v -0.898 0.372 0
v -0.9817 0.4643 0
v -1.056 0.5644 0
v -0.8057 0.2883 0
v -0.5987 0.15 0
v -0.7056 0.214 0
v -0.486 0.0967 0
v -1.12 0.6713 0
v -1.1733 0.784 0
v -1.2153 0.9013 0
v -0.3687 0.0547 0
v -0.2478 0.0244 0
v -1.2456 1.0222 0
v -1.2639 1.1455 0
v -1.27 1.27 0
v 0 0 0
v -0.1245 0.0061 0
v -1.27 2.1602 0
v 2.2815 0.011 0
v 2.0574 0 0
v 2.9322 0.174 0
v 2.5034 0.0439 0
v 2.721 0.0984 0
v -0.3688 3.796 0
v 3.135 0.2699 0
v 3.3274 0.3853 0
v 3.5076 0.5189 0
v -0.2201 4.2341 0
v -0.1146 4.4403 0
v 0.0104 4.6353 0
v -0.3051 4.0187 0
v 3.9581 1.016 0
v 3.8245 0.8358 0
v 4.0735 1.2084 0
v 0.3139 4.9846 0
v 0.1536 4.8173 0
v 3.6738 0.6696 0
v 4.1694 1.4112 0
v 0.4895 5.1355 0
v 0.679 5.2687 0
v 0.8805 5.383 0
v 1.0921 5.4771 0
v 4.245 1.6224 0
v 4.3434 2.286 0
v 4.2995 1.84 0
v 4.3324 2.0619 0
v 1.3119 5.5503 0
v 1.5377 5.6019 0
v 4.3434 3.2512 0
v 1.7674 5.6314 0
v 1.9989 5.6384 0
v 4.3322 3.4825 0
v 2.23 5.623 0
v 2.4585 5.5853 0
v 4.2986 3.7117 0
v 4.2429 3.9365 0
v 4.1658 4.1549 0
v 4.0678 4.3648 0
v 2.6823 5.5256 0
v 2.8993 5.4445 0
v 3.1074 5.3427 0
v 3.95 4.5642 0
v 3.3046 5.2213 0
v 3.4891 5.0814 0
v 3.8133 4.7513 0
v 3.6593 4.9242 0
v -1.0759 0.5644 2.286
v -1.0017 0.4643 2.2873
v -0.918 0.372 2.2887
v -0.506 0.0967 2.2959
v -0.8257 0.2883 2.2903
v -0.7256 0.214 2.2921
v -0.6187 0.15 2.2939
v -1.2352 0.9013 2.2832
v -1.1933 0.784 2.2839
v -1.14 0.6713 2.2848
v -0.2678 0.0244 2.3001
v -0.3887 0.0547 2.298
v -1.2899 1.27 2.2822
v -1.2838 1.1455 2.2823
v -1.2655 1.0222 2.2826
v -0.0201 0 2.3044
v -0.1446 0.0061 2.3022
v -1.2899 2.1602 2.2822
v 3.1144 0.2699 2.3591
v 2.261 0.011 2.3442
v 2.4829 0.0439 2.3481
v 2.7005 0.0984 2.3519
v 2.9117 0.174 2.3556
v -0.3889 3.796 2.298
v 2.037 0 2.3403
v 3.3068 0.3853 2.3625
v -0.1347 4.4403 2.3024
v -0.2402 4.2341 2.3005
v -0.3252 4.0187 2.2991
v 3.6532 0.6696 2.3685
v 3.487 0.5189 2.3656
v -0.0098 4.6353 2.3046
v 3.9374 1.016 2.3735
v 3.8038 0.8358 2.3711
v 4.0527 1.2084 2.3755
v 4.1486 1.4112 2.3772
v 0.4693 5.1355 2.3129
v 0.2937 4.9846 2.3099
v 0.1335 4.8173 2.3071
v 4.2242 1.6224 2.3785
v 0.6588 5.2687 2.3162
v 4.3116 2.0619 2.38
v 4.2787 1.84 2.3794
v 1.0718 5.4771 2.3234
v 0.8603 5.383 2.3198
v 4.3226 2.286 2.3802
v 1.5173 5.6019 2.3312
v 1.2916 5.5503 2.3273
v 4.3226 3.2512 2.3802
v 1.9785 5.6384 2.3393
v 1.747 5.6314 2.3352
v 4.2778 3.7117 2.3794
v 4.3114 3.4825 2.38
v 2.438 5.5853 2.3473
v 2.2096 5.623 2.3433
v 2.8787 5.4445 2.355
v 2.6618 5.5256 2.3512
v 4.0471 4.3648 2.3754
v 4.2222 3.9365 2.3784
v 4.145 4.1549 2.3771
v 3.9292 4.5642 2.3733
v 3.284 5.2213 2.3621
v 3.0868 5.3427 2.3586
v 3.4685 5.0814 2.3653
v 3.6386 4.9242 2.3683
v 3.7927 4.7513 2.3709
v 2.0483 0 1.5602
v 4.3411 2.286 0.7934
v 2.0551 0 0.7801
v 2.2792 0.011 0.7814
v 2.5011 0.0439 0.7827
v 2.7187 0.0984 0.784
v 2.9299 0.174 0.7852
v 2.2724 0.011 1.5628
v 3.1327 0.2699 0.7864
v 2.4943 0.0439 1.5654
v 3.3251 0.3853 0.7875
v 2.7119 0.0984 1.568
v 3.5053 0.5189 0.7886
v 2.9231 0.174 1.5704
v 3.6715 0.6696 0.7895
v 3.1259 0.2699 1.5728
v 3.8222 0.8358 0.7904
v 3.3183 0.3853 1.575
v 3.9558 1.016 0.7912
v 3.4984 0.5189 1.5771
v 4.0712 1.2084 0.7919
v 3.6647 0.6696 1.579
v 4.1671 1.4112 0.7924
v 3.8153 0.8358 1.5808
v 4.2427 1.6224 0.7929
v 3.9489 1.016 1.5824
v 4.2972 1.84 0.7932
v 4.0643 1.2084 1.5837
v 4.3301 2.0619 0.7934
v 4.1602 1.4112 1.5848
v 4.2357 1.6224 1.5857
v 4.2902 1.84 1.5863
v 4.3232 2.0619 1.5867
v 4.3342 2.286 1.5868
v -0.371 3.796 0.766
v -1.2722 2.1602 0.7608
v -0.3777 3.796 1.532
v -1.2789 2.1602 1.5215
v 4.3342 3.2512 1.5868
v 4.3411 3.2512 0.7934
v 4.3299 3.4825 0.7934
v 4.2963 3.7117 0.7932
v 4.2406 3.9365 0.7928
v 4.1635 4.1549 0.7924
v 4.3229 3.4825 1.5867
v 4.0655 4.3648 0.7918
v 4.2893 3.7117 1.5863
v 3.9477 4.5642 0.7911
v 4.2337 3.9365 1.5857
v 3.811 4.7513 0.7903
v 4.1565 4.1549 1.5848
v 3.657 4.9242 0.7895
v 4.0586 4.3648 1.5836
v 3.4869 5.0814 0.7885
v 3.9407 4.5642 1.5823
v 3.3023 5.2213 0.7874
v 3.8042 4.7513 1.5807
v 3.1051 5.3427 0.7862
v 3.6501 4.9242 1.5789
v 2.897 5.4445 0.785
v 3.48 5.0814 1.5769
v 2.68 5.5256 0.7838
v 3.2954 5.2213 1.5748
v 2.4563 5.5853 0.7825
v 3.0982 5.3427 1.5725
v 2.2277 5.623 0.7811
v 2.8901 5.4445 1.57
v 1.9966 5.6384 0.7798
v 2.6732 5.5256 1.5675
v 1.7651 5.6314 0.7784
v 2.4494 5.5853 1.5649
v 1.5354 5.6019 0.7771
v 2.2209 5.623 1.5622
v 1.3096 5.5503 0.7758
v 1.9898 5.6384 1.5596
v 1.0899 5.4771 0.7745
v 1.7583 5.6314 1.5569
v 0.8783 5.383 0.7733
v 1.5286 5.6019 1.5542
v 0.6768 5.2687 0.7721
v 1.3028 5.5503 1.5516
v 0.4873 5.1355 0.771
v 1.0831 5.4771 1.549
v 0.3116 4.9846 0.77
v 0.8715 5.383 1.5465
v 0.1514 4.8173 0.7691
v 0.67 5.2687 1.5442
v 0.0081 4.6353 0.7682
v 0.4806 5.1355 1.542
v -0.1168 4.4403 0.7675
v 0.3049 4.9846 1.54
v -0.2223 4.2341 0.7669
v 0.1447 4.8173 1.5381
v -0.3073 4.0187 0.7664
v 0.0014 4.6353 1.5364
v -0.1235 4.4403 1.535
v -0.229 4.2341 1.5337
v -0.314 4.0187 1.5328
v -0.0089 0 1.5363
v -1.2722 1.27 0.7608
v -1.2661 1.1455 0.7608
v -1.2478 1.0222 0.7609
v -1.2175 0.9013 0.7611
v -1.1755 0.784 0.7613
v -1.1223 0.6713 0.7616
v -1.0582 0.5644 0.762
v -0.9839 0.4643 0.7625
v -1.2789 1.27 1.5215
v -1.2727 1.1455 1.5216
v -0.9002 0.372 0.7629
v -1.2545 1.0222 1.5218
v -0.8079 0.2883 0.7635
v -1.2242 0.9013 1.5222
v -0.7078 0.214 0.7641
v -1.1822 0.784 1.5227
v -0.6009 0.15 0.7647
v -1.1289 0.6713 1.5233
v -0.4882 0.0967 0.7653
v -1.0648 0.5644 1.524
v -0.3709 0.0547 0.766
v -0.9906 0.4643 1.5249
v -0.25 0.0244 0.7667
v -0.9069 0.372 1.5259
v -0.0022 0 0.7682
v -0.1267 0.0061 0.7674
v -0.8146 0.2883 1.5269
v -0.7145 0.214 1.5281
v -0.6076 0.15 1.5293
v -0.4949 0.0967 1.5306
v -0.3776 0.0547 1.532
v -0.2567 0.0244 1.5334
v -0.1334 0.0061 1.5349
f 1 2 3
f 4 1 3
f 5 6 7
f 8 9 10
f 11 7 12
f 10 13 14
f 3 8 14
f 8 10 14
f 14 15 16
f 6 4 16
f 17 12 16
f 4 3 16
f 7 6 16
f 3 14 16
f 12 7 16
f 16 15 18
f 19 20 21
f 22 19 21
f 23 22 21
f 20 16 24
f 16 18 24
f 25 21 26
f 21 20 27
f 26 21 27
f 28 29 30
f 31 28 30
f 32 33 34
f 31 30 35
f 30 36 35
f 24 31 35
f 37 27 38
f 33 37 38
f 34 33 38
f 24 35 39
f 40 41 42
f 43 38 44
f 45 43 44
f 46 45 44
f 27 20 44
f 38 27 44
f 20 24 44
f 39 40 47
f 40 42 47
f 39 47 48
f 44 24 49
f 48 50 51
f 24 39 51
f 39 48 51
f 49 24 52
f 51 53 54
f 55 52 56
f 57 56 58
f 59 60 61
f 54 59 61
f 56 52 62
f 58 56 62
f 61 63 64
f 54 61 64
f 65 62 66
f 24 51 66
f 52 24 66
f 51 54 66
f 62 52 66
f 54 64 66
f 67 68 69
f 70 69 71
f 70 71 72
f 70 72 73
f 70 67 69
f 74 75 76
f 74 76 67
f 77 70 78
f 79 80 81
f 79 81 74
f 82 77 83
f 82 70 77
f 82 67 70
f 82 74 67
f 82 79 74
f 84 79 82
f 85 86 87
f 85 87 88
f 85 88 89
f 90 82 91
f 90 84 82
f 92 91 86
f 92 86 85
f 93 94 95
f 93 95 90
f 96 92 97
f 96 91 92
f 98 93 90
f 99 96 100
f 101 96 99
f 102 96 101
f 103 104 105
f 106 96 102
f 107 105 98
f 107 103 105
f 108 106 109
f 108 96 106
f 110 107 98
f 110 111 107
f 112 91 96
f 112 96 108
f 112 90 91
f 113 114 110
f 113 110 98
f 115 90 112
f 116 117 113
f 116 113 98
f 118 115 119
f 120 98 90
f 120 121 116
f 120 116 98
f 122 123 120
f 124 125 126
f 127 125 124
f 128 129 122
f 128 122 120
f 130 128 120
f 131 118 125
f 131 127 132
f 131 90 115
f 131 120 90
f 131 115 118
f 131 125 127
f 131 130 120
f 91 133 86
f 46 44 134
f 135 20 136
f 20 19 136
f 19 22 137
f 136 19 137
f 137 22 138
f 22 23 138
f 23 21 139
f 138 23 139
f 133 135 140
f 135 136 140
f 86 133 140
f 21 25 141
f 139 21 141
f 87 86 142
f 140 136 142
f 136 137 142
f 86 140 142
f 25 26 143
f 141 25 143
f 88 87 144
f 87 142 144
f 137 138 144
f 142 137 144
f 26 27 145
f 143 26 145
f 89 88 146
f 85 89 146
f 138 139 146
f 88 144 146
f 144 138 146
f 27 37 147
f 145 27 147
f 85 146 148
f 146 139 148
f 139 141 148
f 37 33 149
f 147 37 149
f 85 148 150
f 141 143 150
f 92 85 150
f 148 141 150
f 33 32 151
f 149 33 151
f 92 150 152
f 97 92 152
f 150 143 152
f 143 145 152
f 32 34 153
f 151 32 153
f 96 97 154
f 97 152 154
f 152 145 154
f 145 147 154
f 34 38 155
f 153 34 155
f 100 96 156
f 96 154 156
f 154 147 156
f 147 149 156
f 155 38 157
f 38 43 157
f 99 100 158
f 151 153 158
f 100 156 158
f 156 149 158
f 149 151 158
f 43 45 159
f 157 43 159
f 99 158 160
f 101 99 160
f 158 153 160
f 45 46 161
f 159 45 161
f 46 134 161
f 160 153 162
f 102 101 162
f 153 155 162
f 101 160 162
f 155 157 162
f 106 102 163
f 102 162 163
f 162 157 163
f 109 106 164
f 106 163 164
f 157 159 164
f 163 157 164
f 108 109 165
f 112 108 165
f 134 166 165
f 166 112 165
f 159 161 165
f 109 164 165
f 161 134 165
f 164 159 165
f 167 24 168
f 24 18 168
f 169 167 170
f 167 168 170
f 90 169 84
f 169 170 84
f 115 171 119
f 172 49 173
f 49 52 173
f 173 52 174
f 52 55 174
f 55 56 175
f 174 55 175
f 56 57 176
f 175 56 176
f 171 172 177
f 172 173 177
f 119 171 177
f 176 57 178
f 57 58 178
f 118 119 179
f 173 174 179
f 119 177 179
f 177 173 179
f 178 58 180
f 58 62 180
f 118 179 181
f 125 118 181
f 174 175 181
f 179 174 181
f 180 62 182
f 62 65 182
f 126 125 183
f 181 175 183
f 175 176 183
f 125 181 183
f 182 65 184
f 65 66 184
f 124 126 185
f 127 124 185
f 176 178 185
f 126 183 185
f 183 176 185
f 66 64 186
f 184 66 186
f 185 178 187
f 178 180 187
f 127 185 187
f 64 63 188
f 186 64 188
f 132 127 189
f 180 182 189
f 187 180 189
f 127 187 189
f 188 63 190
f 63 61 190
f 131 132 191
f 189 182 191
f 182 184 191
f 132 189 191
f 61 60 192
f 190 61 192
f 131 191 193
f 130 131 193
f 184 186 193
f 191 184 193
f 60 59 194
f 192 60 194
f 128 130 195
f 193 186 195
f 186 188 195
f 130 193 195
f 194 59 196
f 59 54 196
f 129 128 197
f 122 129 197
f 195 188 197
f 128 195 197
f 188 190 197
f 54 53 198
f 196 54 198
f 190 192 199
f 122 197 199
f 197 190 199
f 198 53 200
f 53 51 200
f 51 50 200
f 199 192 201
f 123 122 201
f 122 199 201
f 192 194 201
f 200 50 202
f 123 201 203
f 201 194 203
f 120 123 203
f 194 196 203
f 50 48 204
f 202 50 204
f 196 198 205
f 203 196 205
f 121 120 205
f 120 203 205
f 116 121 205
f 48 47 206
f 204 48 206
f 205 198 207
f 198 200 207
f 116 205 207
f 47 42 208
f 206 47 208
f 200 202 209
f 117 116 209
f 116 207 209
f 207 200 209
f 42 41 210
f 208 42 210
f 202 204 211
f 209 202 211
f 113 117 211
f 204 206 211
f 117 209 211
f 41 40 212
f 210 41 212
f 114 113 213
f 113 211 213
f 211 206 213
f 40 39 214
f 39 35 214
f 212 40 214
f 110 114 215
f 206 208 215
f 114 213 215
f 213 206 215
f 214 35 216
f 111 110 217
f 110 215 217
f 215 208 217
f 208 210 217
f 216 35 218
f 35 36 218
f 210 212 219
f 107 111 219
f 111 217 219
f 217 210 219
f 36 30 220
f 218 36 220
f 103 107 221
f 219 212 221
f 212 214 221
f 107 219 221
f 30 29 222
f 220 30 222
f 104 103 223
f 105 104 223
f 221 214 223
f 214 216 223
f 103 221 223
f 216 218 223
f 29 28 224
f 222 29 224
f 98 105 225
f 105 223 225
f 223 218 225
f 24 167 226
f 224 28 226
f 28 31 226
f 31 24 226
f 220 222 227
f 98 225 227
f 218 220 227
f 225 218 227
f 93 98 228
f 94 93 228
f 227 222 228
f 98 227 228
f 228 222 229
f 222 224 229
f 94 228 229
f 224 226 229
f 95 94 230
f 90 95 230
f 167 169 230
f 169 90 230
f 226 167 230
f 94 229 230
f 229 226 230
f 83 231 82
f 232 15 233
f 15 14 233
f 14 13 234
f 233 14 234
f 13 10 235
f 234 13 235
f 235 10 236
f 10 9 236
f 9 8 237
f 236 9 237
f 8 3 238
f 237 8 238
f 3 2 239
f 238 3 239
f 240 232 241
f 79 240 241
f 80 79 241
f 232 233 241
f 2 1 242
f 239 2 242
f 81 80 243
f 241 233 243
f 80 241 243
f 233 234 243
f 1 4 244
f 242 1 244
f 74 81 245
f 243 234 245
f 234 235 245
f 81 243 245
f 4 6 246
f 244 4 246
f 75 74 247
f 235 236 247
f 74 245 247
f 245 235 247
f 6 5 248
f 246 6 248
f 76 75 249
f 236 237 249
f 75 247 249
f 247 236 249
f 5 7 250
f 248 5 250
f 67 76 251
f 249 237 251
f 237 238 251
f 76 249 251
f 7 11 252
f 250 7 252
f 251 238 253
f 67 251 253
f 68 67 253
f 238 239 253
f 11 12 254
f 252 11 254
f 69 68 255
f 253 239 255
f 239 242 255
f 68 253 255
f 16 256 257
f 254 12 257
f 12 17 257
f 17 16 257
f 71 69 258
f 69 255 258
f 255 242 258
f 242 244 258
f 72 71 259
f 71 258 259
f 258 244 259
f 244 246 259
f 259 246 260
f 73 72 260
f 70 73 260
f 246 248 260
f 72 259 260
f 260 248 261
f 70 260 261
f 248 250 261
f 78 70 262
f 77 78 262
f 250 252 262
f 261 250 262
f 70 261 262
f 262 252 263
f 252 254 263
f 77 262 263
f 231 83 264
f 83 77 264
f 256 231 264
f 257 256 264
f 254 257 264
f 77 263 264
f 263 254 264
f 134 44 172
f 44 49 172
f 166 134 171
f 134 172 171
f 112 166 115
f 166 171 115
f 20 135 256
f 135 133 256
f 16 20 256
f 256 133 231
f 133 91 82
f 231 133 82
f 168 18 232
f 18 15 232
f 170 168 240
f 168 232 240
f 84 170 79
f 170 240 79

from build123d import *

# Parameters (mm, degrees)
REVOLVE1_ANGLE = 1


with BuildPart() as part:
    # Sketch4 → Revolve1 (revolve)
    with BuildSketch(Plane.XY):
        with BuildLine():
            Line((0, 0), (2.0574, 0))
            ThreePointArc((2.0574, 0), (3.673846102, 0.669553898), (4.3434, 2.286))
            Line((4.3434, 2.286), (4.3434, 3.2512))
            ThreePointArc((4.3434, 3.2512), (2.230011235, 5.623001416), (-0.368814742, 3.795993597))
            Line((-0.368814742, 3.795993597), (-1.27, 2.160242822))
            Line((-1.27, 2.160242822), (-1.27, 1.27))
            ThreePointArc((-1.27, 1.27), (-0.898025612, 0.371974388), (0, 0))
        make_face()
    revolve(axis=Axis((-132.03841004, 8.384500911, 0), (0, -1, 0)), revolution_arc=REVOLVE1_ANGLE)


solid = part.part
